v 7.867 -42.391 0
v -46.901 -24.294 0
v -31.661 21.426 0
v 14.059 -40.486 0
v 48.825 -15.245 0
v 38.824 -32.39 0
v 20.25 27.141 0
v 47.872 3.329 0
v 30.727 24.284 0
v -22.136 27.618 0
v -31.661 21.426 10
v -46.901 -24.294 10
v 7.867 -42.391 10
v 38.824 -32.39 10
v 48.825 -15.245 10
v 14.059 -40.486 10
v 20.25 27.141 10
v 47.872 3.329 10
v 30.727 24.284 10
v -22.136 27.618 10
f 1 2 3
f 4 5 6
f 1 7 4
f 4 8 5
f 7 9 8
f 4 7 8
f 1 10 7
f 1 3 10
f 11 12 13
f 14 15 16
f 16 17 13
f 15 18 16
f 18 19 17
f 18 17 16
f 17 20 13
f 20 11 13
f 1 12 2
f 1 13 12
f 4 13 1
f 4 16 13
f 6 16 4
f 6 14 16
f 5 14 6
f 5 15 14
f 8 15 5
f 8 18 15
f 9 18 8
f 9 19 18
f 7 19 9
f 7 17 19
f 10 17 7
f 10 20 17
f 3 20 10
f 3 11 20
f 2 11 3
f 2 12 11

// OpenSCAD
linear_extrude(height=10)
hull()
scale(0.5)
translate([-150, +80])
polygon(
    points=[
    [86.6775, -37.1475],
    [95.25, -52.3875],
    [121.92, -62.865],
    [159.0675, -55.245],
    [167.64, -89.535],
    [160.02, -94.2975],
    [71.4375, -103.8225],
    [127.635, -115.2525],
    [147.6375, -117.1575],
    [136.2075, -126.6825],
    [121.92, -131.445],
    [103.8225, -133.35],
    [76.2, -132.3975],
    [56.1975, -128.5875],
    [165.735, -164.7825],
    [178.1175, -160.9725],
    [182.88, -138.1125],
    [197.1675, -133.35],
    [202.8825, -148.59],
    [227.6475, -144.78],
    [247.65, -110.49],
    [245.745, -73.3425],
    [224.79, -83.82],
    [236.22, -92.3925],
    [220.0275, -99.06],
    [202.8825, -93.345],
    [194.31, -74.295],
    [215.265, -66.675],
    [227.6475, -52.3875],
    [211.455, -31.4325],
    [190.5, -25.7175],
    [147.6375, -29.5275],
    [105.7275, -24.765]
    ]
);
